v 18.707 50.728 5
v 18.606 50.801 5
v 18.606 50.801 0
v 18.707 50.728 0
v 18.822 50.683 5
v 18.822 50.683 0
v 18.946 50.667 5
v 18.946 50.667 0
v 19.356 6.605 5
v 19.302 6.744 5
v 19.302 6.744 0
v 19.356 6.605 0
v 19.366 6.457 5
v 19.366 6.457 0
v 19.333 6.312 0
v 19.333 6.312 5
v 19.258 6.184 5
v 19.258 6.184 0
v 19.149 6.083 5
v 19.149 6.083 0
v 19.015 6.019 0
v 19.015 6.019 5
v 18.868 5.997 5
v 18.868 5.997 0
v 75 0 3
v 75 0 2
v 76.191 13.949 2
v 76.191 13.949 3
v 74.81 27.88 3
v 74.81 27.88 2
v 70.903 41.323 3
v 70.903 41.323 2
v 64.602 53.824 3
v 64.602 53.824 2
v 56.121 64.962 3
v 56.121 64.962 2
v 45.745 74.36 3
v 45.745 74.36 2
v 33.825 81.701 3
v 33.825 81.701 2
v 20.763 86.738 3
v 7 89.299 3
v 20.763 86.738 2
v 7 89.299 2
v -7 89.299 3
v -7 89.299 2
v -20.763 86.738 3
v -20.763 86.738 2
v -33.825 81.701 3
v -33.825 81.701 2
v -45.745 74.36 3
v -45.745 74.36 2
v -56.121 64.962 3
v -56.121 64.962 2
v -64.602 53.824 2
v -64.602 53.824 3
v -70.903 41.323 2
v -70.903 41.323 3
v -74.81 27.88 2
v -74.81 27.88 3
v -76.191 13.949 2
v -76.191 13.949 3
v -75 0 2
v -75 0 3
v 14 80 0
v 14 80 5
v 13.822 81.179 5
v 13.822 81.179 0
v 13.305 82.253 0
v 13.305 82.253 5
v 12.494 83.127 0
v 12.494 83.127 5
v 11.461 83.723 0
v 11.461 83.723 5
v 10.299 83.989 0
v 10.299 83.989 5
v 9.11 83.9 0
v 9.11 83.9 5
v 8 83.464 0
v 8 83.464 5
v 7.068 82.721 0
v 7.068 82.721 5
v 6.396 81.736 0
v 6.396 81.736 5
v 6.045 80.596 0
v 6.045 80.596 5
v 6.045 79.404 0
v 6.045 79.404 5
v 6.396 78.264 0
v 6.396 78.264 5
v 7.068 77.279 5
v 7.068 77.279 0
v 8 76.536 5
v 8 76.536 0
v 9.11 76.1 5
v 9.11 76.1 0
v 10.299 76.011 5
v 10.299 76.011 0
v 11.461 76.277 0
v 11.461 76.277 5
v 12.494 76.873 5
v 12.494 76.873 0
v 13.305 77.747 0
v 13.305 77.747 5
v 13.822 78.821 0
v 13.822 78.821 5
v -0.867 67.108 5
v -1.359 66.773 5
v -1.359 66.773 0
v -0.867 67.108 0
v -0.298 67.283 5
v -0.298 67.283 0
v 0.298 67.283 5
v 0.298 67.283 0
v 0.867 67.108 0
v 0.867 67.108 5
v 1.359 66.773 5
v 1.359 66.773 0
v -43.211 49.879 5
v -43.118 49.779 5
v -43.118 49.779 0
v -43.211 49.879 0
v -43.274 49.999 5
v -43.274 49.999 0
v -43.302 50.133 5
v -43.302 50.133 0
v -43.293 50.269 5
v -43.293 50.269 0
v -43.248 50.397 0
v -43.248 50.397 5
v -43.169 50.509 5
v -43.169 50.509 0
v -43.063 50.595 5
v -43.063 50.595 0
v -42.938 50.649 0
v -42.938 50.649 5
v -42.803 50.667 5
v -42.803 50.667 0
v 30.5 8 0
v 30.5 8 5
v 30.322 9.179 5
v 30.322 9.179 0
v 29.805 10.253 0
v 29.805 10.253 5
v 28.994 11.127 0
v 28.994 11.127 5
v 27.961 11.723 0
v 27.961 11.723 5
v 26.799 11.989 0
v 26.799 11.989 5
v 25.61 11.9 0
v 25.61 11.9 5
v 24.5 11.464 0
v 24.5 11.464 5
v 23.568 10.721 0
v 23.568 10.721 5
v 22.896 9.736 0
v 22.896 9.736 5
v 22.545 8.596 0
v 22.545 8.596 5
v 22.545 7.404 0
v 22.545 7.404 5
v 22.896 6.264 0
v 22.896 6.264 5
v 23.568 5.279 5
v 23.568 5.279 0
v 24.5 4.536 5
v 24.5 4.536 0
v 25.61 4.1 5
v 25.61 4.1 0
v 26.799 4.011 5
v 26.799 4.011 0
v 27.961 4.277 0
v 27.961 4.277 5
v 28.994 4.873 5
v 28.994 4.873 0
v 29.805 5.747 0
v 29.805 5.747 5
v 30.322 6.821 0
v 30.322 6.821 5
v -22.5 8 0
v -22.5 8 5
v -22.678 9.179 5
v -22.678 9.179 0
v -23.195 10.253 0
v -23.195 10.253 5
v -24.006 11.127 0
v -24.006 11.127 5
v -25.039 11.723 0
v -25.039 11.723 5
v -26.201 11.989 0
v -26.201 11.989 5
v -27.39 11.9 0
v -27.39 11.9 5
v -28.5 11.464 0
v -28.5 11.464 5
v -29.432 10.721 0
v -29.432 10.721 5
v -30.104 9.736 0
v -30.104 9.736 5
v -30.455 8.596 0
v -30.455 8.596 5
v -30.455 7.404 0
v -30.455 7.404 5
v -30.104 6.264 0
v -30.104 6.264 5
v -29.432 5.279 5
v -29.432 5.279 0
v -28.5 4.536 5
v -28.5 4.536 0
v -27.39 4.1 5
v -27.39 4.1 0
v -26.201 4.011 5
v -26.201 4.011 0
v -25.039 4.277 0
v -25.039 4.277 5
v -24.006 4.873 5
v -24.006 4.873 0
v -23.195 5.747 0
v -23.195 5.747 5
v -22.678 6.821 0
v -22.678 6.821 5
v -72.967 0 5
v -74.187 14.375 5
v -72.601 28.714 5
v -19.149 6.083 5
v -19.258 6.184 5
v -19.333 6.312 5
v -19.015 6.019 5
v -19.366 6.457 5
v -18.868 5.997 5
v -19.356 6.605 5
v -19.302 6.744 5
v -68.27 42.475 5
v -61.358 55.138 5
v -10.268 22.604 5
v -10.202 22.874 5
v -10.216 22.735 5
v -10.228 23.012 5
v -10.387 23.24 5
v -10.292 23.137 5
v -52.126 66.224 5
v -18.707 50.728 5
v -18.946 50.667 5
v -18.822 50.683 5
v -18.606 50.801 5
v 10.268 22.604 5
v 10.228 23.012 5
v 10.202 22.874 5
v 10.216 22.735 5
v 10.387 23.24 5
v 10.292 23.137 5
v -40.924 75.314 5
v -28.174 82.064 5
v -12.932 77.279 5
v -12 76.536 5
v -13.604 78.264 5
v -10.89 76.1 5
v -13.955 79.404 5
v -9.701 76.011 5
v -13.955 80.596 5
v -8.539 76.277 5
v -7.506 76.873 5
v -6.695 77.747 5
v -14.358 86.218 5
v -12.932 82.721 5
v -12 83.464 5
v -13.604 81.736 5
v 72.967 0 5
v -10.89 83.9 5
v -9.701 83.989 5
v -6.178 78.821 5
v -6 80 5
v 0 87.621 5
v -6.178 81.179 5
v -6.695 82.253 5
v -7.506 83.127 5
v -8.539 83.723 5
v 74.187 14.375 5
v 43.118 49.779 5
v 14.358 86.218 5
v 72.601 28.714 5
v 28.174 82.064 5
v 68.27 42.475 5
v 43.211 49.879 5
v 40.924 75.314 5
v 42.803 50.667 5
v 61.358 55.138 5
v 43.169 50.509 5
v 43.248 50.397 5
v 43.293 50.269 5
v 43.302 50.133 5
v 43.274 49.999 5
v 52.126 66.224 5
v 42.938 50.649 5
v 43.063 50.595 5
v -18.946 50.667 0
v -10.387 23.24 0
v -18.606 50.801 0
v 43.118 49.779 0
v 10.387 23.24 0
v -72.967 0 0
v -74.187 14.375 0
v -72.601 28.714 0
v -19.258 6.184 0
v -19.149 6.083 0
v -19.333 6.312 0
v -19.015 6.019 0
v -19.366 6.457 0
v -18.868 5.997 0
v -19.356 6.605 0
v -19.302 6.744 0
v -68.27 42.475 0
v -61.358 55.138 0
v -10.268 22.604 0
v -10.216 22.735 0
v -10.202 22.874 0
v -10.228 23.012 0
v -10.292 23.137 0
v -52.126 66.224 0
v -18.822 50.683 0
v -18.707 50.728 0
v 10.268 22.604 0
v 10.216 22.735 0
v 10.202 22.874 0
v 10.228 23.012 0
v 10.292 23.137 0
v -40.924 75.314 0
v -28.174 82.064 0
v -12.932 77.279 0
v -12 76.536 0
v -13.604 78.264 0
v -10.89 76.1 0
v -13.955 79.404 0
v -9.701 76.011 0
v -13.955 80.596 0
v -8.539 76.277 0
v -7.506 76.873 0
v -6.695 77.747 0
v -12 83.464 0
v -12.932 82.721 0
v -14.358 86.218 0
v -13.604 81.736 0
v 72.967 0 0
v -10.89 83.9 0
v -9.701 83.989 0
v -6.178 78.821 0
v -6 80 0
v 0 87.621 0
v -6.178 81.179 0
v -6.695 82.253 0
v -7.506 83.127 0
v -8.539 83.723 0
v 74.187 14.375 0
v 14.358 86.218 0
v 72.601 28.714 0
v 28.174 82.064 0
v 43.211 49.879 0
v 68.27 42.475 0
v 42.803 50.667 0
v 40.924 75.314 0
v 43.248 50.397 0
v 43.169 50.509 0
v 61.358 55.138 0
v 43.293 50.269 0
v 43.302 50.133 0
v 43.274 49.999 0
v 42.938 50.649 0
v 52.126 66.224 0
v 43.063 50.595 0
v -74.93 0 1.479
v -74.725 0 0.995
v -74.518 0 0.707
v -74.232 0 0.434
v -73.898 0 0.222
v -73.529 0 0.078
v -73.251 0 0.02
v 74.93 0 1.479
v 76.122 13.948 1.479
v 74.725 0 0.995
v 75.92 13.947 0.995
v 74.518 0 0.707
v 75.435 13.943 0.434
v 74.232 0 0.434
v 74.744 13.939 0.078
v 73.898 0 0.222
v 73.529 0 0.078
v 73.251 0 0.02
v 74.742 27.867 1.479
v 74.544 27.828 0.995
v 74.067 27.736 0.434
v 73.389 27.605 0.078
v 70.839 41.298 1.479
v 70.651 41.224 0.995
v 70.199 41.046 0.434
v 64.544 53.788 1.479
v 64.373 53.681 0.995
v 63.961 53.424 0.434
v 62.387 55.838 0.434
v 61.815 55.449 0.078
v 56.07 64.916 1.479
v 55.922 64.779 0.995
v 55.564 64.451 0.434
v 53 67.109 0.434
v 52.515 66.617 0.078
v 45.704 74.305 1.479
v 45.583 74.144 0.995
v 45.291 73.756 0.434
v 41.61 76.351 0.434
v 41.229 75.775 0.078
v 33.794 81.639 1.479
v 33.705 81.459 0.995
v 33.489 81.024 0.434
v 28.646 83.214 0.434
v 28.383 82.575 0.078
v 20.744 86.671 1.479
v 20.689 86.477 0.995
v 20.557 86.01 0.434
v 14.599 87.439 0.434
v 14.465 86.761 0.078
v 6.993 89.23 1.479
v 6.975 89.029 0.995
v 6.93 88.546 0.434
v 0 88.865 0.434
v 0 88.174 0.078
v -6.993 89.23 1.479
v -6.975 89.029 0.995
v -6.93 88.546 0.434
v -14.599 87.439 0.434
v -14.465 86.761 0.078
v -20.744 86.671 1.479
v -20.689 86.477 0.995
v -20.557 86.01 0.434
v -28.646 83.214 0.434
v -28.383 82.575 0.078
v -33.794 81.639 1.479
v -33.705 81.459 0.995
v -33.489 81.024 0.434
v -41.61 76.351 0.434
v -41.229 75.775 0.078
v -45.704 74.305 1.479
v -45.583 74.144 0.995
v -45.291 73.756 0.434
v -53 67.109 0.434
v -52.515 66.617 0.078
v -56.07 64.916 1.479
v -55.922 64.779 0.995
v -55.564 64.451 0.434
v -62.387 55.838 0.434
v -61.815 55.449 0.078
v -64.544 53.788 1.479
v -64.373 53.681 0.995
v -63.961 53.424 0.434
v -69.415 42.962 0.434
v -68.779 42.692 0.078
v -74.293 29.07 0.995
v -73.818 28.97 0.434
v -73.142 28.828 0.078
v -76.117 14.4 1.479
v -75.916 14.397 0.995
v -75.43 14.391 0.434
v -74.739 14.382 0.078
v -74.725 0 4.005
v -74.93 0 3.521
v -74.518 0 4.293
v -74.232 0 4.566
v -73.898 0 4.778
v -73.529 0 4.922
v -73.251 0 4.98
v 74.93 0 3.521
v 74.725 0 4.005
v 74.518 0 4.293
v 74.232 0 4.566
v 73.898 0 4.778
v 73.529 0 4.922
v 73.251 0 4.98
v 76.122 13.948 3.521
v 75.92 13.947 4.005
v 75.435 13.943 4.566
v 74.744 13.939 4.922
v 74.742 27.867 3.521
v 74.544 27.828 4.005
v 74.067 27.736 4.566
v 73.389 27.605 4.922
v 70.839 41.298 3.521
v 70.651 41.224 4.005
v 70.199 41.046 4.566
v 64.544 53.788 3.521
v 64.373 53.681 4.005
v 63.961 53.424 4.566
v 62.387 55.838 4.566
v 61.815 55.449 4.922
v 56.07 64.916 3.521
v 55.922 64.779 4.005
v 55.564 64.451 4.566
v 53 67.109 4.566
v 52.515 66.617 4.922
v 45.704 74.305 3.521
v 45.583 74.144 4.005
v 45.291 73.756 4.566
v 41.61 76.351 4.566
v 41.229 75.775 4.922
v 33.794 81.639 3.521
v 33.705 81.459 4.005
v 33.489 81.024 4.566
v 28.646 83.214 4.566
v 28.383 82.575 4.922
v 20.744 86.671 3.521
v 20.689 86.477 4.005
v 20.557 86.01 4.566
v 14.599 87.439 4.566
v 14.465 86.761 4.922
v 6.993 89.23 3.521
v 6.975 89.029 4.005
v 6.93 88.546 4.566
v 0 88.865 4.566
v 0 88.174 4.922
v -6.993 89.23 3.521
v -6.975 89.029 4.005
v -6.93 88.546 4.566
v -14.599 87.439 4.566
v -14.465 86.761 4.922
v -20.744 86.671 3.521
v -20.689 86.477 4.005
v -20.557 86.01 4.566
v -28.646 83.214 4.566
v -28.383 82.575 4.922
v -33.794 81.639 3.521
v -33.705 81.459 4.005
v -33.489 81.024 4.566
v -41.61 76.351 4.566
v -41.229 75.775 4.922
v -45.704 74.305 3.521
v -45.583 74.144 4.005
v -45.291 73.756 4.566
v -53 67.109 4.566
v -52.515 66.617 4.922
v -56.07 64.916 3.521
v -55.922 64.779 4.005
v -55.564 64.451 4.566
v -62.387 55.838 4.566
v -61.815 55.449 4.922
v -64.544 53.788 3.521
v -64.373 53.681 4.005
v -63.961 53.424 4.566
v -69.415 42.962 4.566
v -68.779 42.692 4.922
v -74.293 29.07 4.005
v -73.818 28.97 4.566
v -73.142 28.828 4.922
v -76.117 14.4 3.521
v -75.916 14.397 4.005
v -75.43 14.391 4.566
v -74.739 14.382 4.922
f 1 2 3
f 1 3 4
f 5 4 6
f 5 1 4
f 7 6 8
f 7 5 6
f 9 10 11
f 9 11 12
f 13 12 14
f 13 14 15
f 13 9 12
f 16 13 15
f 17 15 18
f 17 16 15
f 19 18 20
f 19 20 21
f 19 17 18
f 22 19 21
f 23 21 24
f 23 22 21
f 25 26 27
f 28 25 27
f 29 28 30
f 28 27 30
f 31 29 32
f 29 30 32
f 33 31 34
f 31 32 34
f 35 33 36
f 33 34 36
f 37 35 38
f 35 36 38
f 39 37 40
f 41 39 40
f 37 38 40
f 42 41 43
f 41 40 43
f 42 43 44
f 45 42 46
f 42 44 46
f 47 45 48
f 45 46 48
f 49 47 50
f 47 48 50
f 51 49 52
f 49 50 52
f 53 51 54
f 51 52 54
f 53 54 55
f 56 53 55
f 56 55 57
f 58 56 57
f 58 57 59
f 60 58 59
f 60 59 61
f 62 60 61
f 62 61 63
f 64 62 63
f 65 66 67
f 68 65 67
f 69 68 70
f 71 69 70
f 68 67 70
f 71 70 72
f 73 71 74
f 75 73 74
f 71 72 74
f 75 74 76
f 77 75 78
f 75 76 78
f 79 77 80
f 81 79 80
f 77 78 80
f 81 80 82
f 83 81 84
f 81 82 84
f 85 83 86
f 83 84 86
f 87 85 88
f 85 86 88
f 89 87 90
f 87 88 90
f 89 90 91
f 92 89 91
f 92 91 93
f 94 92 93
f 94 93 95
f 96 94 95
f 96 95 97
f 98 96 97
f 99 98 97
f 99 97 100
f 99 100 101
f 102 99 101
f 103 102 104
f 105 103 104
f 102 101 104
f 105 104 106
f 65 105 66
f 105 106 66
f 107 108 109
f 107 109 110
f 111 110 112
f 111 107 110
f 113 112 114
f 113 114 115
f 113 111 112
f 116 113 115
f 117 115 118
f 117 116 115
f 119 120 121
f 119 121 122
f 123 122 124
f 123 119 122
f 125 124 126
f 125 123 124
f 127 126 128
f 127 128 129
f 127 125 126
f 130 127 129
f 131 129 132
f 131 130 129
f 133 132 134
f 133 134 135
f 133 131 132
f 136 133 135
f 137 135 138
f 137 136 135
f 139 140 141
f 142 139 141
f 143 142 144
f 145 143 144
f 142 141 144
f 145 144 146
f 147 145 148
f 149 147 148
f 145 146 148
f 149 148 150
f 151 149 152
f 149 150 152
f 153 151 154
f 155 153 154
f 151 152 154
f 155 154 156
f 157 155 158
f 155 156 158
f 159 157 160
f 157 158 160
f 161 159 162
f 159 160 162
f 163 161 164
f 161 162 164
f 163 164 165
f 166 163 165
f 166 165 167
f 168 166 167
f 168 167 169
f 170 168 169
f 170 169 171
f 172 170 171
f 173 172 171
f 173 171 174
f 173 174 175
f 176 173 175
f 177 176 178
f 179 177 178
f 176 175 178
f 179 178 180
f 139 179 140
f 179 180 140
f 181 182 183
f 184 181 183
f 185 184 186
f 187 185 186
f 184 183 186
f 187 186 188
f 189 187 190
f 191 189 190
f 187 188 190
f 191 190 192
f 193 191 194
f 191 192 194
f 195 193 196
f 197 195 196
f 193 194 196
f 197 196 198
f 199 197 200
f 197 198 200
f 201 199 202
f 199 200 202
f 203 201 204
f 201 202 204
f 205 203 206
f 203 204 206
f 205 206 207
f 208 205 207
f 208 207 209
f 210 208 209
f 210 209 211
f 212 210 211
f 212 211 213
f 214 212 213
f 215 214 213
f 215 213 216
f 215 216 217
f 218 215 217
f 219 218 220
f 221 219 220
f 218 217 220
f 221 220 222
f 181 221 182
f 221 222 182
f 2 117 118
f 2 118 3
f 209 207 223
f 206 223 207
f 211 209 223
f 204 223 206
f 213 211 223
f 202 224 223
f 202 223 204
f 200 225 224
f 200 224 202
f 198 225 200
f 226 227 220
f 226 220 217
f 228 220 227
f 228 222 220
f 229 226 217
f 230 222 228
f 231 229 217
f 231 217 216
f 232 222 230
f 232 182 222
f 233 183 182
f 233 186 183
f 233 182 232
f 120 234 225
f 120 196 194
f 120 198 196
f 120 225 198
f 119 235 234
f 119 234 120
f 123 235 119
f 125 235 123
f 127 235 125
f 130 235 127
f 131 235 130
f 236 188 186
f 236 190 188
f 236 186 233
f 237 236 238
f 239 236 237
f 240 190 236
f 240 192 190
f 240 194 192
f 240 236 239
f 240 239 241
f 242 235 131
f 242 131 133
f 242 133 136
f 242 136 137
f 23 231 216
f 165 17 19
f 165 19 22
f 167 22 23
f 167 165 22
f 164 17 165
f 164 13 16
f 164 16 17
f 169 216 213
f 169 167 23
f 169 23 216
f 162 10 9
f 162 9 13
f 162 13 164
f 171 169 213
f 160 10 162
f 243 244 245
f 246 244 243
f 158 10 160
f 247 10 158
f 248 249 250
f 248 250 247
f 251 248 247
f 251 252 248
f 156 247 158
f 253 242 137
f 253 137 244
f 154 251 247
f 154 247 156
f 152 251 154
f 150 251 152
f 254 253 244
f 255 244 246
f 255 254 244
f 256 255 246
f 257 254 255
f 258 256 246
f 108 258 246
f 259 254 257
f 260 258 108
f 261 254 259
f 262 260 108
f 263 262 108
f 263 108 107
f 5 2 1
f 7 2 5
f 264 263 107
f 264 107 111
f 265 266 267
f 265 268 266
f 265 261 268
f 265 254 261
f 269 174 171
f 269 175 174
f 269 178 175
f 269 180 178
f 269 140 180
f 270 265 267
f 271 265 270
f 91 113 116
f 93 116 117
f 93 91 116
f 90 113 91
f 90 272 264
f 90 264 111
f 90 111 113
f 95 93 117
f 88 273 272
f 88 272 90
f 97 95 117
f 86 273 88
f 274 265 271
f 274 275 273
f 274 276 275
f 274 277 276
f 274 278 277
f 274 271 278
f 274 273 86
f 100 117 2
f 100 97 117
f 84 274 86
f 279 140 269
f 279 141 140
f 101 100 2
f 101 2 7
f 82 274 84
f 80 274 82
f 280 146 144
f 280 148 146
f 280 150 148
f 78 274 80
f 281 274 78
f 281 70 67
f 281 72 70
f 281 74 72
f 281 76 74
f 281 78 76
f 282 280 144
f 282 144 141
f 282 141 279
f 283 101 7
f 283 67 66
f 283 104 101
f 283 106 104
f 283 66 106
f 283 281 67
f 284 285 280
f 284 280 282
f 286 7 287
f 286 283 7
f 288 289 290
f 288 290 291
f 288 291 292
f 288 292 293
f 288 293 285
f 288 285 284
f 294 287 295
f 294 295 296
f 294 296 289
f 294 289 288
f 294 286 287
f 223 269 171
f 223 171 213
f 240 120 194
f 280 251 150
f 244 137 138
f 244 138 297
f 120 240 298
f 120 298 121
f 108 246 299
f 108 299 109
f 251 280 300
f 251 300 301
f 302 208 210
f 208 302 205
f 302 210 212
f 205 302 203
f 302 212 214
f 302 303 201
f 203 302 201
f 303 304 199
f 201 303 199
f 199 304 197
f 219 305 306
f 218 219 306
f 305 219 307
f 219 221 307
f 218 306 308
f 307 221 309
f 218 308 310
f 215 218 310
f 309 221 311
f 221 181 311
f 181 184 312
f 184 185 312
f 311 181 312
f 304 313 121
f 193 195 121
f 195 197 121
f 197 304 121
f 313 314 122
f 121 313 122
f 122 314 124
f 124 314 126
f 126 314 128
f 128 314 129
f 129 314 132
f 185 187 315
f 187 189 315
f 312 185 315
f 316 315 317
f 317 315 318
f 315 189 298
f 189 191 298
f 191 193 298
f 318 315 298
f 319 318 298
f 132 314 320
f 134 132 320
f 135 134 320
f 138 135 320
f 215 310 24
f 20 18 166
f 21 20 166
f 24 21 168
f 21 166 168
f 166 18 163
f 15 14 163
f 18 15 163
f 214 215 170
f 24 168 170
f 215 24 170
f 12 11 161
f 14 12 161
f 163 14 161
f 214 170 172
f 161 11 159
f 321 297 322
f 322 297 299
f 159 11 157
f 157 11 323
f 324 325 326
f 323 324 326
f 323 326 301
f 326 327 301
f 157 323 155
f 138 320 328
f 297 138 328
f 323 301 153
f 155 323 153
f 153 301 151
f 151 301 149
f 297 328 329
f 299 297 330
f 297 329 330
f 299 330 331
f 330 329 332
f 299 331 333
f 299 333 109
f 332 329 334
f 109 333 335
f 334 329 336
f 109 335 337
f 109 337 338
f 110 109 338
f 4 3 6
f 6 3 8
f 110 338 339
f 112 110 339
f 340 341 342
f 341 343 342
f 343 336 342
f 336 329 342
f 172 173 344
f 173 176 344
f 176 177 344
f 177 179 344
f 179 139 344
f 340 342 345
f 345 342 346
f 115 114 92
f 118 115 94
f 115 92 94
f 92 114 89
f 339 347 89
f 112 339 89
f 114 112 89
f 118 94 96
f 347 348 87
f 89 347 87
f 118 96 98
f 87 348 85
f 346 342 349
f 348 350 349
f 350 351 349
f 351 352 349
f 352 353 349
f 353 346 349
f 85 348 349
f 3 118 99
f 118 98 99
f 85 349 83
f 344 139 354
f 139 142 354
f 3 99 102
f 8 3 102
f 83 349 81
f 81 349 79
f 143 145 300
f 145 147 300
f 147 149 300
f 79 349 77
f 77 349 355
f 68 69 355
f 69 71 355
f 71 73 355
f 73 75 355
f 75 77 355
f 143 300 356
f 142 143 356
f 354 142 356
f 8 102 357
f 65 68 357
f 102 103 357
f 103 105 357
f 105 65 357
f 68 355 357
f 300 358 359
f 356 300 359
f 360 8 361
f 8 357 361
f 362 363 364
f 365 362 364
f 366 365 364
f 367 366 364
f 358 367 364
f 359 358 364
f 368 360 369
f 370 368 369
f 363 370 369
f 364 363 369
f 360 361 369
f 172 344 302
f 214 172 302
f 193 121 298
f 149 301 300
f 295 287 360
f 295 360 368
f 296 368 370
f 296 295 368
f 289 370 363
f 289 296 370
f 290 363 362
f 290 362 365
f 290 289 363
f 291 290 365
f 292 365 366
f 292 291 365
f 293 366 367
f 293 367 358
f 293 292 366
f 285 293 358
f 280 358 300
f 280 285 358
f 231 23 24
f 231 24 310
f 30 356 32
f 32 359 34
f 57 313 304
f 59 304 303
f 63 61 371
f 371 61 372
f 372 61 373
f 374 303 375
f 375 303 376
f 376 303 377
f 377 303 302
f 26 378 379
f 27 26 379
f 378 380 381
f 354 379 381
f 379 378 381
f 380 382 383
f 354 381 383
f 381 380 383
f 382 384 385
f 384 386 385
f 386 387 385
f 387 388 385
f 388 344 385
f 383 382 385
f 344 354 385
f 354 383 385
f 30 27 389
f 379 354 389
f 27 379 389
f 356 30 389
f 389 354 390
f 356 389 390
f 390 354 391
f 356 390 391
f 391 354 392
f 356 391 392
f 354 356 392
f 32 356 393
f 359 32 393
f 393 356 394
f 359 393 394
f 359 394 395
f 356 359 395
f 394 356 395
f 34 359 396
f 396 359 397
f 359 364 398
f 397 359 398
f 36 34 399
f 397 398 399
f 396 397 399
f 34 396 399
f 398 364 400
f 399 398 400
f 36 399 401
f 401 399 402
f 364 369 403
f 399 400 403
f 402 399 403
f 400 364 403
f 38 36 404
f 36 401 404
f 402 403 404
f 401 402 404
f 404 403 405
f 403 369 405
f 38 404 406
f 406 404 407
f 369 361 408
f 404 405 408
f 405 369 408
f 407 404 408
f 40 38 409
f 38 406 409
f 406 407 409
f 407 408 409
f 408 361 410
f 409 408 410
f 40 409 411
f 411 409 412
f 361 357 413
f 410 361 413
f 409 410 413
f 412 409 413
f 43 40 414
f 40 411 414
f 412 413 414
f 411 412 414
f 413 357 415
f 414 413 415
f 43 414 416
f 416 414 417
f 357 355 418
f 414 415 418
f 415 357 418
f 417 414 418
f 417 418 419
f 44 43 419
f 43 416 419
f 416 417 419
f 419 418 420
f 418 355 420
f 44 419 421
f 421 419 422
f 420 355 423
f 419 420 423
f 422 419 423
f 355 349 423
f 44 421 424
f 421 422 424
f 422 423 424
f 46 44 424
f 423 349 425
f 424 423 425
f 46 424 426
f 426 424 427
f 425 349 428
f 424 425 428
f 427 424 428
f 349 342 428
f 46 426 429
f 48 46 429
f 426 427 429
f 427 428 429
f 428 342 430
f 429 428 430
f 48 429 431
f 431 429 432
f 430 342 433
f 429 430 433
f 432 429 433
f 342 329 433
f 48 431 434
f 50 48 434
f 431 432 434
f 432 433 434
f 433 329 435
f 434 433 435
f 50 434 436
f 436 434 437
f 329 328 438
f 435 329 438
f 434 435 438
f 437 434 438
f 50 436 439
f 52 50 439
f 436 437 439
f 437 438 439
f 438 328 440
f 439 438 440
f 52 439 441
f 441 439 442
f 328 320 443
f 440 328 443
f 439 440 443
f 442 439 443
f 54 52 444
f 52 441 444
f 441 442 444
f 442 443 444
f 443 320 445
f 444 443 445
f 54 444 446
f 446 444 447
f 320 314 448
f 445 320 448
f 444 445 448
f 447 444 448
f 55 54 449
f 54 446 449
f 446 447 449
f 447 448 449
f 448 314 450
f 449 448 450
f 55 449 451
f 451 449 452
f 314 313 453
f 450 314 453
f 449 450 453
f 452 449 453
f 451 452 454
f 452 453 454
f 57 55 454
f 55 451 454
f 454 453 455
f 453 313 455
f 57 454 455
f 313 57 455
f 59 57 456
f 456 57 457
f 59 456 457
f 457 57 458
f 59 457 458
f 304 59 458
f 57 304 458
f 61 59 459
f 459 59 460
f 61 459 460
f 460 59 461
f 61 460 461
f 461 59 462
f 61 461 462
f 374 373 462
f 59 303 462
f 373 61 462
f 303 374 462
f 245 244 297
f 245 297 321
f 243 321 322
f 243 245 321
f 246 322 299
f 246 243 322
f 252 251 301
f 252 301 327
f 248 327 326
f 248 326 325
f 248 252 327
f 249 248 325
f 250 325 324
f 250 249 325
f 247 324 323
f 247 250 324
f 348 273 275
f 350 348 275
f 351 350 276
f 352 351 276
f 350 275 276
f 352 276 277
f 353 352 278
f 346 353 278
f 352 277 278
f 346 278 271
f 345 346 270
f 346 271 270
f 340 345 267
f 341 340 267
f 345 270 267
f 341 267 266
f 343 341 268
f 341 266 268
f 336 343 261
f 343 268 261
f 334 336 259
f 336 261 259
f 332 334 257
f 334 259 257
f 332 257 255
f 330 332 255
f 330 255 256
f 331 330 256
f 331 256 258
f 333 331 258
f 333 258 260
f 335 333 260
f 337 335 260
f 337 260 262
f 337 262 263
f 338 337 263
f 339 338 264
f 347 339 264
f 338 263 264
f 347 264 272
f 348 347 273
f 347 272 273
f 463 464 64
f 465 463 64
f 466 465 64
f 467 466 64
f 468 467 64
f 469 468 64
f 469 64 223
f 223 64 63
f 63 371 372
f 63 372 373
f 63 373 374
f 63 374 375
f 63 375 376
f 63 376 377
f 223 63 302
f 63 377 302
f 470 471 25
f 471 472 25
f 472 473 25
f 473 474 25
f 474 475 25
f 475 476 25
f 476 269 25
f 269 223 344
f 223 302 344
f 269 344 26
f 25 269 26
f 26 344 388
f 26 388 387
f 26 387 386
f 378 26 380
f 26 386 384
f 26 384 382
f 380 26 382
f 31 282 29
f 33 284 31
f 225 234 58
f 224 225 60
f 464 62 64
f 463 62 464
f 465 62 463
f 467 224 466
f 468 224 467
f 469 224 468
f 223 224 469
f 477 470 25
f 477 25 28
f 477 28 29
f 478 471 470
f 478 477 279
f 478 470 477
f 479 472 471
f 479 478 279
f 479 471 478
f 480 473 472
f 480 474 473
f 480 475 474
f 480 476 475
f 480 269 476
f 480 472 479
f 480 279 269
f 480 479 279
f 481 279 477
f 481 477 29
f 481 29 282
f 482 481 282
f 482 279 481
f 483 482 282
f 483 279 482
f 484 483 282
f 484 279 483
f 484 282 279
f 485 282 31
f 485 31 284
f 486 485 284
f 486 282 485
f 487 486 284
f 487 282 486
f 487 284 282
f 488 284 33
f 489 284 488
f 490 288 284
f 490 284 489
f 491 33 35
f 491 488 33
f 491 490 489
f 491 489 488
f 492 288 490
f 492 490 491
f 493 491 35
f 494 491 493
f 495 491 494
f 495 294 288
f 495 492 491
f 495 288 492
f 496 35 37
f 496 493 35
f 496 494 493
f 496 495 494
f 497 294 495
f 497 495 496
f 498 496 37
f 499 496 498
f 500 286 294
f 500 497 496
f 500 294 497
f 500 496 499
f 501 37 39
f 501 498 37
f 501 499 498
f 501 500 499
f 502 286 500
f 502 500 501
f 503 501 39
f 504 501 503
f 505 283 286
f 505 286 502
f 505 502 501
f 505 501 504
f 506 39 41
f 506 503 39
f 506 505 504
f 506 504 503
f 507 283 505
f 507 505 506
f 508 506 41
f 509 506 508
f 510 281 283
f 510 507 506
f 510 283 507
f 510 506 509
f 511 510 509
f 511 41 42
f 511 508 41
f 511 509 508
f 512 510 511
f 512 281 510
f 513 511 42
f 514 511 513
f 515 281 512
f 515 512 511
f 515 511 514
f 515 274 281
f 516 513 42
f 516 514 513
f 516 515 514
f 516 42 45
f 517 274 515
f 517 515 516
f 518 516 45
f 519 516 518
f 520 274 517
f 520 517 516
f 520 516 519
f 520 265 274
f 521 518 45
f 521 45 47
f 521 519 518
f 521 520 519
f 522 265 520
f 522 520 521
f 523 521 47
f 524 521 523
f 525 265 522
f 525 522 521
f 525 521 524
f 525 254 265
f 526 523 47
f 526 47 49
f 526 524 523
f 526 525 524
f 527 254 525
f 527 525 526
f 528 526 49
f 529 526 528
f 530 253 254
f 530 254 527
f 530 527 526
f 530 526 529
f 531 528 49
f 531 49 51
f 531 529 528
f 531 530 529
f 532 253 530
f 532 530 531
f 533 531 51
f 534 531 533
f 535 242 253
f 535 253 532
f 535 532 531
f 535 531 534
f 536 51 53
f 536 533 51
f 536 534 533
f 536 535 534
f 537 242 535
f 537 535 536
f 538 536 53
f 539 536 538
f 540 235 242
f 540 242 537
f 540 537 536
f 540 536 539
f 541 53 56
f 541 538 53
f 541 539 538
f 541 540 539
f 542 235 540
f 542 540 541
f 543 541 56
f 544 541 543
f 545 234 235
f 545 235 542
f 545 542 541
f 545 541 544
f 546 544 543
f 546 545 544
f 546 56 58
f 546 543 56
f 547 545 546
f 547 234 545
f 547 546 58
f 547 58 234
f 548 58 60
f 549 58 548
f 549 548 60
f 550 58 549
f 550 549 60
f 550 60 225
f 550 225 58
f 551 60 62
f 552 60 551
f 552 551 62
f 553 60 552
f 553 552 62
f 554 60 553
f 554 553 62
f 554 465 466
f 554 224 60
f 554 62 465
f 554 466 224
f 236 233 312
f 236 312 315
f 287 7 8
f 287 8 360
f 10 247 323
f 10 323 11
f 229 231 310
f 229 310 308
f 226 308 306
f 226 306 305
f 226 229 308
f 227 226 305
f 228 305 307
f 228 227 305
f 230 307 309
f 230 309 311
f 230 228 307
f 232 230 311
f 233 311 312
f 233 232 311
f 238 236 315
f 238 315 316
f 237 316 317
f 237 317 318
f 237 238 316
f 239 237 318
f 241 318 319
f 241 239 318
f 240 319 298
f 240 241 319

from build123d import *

# Parameters (mm, degrees)
BOSS_EXTRUDE1_DEPTH = 5
SKETCH2_R           = 4
CUT_EXTRUDE1_DEPTH  = 5
CUT_EXTRUDE2_DEPTH  = 5
FILLET1_R           = 2


with BuildPart() as part:
    # Sketch1 → Boss-Extrude1 (new body)
    with BuildSketch(Plane.XY):
        with BuildLine():
            Line((-75, 0), (75, 0))
            ThreePointArc((75, 0), (0, 89.621051558), (-75, 0))
        make_face()
    extrude(amount=BOSS_EXTRUDE1_DEPTH)

    # Sketch2 → Cut-Extrude1 (cut)
    with BuildSketch(Plane.XY.offset(5)):
        with Locations((26.5, 8)):
            Circle(SKETCH2_R)
        with Locations((10, 80)):
            Circle(SKETCH2_R)
        with Locations((-10, 80)):
            Circle(SKETCH2_R)
        with Locations((-26.5, 8)):
            Circle(SKETCH2_R)
    extrude(amount=-CUT_EXTRUDE1_DEPTH, mode=Mode.SUBTRACT)

    # Sketch3 → Cut-Extrude2 (cut)
    with BuildSketch(Plane.XY.offset(5)):
        with BuildLine():
            Line((18.867867545, 5.996639034), (-18.867867545, 5.996639034))
            ThreePointArc((-18.867867545, 5.996639034), (-19.300154289, 6.245385832), (-19.302321259, 6.744126348))
            Line((-19.302321259, 6.744126348), (-10.267508213, 22.604365842))
            ThreePointArc((-10.267508213, 22.604365842), (-10.210571808, 22.944242288), (-10.387060948, 23.240231031))
            Line((-10.387060948, 23.240231031), (-43.118302779, 49.77907576))
            ThreePointArc((-43.118302779, 49.77907576), (-43.274670798, 50.334503122), (-42.8034018, 50.667453634))
            Line((-42.8034018, 50.667453634), (-18.945540234, 50.667453634))
            ThreePointArc((-18.945540234, 50.667453634), (-18.763089024, 50.70193075), (-18.605799379, 50.80060741))
            Line((-18.605799379, 50.80060741), (-1.358963418, 66.773116887))
            ThreePointArc((-1.358963418, 66.773116887), (0, 67.305731992), (1.358963418, 66.773116887))
            Line((1.358963418, 66.773116887), (18.605799379, 50.80060741))
            ThreePointArc((18.605799379, 50.80060741), (18.763089024, 50.70193075), (18.945540234, 50.667453634))
            Line((18.945540234, 50.667453634), (42.8034018, 50.667453634))
            ThreePointArc((42.8034018, 50.667453634), (43.274670798, 50.334503122), (43.118302779, 49.77907576))
            Line((43.118302779, 49.77907576), (10.387060948, 23.240231031))
            ThreePointArc((10.387060948, 23.240231031), (10.210571808, 22.944242288), (10.267508213, 22.604365842))
            Line((10.267508213, 22.604365842), (19.302321259, 6.744126348))
            ThreePointArc((19.302321259, 6.744126348), (19.300154289, 6.245385832), (18.867867545, 5.996639034))
        make_face()
    extrude(amount=-CUT_EXTRUDE2_DEPTH, mode=Mode.SUBTRACT)

    # Fillet1
    fillet1_edges = [part.edges().sort_by_distance(p)[0] for p in [
        (0, 89.621051558, 0),
        (0, 89.621051558, 5),
    ]]
    fillet(fillet1_edges, radius=FILLET1_R)


solid = part.part
